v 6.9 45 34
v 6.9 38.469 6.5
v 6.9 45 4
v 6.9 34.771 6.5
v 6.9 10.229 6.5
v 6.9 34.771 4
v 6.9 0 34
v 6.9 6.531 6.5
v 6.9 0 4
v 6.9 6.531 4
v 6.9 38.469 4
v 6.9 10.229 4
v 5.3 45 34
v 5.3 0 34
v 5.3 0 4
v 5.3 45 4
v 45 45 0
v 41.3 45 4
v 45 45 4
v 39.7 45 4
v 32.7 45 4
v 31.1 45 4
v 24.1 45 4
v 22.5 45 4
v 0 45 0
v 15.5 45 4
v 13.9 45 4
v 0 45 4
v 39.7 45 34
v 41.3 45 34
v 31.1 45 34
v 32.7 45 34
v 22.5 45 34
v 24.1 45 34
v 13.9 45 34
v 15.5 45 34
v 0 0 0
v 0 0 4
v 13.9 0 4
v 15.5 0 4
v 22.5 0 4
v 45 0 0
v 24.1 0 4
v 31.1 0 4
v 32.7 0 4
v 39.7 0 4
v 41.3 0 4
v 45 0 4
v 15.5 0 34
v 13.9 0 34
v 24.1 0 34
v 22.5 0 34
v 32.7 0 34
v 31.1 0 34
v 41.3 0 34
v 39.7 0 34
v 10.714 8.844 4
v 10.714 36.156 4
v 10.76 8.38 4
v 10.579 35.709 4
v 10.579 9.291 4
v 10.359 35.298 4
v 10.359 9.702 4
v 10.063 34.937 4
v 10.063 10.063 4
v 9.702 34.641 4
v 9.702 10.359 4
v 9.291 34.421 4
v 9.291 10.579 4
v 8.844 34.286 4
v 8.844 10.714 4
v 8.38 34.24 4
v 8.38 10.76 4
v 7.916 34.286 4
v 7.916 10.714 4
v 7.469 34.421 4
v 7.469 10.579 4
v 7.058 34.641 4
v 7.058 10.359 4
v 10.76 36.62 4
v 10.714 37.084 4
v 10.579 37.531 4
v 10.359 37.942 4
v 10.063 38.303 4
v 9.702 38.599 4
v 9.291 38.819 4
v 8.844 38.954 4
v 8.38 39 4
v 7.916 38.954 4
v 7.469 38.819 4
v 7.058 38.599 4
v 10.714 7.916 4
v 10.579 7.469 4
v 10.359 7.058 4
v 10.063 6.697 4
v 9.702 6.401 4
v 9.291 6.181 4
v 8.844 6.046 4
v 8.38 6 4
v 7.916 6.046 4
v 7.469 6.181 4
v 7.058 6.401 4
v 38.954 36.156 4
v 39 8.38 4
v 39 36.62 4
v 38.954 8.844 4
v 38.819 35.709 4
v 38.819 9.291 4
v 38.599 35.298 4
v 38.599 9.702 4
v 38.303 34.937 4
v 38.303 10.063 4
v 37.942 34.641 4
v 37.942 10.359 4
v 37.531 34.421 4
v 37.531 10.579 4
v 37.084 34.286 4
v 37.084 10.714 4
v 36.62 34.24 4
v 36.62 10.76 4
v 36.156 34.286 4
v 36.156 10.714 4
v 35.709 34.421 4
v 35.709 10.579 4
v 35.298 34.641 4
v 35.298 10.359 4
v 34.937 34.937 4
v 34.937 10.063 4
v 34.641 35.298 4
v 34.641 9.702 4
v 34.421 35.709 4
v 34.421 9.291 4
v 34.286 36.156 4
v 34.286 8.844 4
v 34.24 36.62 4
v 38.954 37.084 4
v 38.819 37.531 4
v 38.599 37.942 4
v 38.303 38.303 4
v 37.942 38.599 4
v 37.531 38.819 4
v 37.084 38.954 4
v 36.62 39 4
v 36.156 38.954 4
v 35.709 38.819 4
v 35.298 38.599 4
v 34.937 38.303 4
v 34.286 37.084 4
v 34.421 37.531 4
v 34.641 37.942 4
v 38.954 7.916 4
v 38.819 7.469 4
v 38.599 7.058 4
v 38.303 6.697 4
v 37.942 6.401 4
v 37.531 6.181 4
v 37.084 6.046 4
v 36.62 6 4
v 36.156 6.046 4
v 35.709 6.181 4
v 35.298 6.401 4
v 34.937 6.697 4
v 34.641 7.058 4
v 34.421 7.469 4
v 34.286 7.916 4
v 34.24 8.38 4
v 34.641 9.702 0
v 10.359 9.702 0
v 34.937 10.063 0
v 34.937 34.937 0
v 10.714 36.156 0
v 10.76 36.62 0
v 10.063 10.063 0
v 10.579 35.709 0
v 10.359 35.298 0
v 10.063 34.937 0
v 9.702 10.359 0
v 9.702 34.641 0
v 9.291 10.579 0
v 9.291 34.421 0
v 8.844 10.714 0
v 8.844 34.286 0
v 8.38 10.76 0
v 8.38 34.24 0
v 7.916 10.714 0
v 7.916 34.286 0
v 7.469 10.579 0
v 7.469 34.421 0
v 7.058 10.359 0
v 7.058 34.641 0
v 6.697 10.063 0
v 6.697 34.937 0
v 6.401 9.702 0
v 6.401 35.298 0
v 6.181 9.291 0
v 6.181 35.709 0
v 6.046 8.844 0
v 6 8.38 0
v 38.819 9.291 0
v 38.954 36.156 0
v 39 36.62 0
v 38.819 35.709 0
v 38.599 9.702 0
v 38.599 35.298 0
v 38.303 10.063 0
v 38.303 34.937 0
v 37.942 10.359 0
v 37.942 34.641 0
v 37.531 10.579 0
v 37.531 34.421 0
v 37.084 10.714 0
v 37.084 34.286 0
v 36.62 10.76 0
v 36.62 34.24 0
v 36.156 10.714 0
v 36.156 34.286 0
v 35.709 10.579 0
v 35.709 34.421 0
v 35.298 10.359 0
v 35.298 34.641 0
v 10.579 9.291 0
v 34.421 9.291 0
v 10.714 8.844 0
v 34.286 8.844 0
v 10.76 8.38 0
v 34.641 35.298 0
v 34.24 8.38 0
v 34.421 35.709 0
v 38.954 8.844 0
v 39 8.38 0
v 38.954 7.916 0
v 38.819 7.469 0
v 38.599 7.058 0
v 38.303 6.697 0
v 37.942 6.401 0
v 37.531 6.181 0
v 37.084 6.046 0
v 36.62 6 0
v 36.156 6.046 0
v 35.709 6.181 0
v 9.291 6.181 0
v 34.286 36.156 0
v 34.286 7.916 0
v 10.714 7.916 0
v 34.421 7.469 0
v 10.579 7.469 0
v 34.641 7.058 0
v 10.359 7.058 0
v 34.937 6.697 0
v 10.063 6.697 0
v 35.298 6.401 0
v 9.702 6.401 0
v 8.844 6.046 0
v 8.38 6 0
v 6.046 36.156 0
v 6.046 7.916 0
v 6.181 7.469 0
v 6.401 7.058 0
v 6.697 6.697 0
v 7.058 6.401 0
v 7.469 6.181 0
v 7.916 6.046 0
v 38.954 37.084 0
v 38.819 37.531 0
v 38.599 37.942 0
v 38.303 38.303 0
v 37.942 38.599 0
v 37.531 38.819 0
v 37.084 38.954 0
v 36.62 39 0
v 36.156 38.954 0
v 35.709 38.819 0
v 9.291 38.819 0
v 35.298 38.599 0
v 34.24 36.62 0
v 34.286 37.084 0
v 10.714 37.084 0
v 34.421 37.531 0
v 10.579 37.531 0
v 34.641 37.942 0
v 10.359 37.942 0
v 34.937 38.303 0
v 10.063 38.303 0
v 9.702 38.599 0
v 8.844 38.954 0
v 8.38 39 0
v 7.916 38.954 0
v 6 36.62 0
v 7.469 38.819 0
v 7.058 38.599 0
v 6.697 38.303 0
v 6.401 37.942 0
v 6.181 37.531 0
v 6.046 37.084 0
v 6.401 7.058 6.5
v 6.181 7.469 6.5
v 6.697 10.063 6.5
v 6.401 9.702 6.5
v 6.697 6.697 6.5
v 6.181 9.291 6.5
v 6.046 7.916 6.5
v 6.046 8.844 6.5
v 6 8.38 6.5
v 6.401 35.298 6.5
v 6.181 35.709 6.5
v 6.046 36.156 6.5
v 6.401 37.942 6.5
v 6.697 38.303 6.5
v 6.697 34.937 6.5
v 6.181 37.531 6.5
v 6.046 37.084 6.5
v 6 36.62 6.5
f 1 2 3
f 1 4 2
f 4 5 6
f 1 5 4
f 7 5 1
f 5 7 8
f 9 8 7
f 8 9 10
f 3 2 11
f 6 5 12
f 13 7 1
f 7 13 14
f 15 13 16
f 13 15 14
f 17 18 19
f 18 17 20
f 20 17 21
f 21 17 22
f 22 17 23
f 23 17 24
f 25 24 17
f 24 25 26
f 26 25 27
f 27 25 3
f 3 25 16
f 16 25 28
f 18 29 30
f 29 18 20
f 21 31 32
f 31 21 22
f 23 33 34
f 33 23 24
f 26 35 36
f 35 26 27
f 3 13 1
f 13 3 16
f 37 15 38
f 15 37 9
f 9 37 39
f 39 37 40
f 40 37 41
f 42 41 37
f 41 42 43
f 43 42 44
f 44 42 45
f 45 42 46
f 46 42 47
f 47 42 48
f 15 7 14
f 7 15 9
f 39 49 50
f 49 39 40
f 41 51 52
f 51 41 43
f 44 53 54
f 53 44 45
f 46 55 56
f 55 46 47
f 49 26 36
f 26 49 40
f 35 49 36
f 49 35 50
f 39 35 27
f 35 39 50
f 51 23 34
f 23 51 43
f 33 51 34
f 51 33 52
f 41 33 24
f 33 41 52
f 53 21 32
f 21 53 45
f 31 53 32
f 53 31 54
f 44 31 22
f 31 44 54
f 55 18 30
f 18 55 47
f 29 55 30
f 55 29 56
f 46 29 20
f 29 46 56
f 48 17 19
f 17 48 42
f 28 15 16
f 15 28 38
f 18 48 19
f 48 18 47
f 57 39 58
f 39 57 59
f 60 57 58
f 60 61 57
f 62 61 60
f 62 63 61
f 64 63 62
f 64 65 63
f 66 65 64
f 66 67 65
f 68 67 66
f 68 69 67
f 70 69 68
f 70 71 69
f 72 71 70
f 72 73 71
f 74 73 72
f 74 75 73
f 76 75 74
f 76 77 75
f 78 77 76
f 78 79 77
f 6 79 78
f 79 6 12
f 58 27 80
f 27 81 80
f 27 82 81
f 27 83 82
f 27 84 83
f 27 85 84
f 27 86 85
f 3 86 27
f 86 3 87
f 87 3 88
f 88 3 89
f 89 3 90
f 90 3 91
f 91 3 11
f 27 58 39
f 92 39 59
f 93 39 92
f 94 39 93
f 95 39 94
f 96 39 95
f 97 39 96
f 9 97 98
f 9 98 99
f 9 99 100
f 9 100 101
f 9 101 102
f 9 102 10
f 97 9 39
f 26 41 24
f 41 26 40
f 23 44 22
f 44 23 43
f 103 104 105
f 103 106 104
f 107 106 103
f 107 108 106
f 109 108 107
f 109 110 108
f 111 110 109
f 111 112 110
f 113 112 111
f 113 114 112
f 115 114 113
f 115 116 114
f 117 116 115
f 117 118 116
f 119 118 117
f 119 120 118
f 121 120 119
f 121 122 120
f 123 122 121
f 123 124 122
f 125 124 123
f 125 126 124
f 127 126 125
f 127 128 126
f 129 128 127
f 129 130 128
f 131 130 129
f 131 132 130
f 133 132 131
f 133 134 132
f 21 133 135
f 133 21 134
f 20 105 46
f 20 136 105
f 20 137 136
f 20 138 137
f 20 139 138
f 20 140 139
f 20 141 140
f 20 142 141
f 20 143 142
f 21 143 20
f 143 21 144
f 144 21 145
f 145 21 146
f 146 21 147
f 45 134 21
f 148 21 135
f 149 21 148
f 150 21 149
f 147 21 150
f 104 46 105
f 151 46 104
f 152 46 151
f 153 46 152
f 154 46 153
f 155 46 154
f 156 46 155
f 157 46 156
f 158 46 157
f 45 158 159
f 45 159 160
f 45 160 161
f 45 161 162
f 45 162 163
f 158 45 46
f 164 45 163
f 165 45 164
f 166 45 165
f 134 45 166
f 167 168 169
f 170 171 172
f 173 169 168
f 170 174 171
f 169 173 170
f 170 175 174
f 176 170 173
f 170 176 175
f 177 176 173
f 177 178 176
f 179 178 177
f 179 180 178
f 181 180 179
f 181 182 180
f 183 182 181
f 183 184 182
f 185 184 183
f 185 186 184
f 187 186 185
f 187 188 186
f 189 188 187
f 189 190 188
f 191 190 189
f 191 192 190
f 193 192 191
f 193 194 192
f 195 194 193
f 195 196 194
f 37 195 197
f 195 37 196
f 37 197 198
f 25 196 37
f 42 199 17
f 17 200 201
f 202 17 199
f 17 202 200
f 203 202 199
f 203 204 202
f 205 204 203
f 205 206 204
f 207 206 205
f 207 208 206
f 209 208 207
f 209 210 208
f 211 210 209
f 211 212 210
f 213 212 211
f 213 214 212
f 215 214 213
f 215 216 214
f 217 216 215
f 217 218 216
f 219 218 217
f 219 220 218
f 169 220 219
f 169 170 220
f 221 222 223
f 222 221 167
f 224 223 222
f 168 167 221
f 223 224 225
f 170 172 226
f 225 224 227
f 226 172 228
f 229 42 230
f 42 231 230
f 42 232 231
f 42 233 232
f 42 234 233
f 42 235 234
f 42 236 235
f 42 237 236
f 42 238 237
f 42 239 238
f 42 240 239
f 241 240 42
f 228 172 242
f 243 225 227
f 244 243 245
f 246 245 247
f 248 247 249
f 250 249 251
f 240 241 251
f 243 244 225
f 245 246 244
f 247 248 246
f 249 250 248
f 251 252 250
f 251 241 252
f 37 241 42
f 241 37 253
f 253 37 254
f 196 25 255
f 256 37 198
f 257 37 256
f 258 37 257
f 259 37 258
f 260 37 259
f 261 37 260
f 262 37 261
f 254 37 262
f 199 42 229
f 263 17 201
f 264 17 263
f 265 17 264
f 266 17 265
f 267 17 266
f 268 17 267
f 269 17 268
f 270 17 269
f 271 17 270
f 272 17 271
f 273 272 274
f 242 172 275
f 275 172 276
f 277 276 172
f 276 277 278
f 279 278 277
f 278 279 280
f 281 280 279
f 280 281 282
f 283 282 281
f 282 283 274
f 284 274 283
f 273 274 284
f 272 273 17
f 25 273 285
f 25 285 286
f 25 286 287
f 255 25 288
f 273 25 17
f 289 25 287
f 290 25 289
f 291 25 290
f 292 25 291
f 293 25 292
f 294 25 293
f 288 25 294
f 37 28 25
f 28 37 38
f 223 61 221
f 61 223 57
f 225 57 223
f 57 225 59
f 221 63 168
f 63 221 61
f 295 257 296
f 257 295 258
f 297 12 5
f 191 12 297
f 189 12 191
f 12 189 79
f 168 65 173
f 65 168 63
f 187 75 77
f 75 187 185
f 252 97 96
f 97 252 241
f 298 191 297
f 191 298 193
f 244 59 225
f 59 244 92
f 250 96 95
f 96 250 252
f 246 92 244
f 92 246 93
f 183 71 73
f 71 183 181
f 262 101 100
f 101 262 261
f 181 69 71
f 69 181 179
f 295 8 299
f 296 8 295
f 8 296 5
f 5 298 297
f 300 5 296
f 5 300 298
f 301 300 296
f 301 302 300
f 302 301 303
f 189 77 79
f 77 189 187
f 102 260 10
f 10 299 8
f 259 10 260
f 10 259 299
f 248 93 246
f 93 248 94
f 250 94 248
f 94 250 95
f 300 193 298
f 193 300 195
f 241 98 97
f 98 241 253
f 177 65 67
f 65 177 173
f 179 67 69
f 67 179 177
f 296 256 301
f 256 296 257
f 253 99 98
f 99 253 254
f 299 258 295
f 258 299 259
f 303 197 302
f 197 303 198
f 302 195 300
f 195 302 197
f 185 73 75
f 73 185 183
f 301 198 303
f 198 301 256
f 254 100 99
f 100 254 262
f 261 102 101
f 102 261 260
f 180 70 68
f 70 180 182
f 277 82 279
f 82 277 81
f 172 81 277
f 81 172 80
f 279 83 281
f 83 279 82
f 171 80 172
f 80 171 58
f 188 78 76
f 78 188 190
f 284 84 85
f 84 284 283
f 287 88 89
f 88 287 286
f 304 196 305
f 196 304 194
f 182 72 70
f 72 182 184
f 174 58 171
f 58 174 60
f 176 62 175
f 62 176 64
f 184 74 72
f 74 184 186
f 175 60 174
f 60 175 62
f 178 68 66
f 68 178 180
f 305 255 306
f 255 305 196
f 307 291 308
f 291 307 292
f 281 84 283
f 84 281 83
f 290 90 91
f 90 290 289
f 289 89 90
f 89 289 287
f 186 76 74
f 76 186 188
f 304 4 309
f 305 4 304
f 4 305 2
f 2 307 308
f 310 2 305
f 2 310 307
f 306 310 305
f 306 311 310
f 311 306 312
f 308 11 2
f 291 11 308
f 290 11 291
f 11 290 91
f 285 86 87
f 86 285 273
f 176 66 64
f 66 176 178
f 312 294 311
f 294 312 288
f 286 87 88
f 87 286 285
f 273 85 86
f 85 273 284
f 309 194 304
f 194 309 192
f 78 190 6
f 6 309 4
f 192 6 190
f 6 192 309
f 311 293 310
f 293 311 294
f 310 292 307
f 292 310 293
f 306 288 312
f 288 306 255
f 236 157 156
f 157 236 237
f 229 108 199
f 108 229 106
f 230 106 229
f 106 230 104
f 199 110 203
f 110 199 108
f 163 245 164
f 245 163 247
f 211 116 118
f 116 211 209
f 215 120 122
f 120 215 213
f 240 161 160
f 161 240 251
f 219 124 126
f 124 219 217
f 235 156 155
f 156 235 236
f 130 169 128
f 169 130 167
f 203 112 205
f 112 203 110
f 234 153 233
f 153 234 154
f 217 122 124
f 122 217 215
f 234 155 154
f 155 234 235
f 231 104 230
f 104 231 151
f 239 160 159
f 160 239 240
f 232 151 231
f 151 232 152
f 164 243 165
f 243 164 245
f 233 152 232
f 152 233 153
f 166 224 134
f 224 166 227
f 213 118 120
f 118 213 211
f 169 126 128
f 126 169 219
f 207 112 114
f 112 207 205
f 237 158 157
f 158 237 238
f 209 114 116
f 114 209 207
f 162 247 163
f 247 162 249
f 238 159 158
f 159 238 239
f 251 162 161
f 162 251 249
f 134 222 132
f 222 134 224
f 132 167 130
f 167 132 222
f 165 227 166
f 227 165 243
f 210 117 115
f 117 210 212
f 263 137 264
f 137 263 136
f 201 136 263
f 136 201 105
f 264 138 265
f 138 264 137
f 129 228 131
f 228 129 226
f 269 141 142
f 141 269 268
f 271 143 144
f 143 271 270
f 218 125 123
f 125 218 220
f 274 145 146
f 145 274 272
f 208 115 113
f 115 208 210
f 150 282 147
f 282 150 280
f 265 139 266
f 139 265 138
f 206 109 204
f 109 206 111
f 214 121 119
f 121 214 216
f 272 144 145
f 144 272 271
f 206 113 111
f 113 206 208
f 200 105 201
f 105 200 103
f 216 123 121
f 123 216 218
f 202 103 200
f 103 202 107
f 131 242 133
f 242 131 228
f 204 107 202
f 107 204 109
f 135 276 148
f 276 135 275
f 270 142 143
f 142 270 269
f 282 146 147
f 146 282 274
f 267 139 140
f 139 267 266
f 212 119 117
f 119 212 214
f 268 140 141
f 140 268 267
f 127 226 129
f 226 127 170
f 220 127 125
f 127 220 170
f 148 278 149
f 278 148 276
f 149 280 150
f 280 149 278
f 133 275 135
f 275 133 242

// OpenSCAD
$fn = 32;

// ----------------------------------------------------------------------
// Finned heat sink: 45 x 45 mm base, 30 mm fins
// ----------------------------------------------------------------------

// --- parameters (mm) ---
base_w = 45;              // base width
base_d = 45;              // base depth
base_t = 4;               // base thickness
fin_h = 30;               // fin height above the base
holes_d = 4.76;           // fixing holes
hole_x = 14.12;           // hole offset in x
hole_y = 14.12;           // hole offset in y
fin_t = 1.6;              // fin thickness
fin_pitch = 8.6;          // fin pitch
fin_count = 5;            // number of fins
fin_x0 = 5.3;             // first fin offset

difference() {
  union() {
    cube([base_w, base_d, base_t]);
    for (i = [0 : fin_count - 1]) {
      translate([fin_x0 + i * fin_pitch, 0, base_t - 0.5]) cube([fin_t, base_d, fin_h + 0.5]);
    }
  }
  /* fixing holes through the base, 2.5 mm clear on both sides */
  for (hx = [-14.12, 14.12]) {
    for (hy = [-14.12, 14.12]) {
      translate([base_w / 2 + hx, base_d / 2 + hy, -2.5]) cylinder(h = base_t + 5, d = holes_d);
    }
  }
}
